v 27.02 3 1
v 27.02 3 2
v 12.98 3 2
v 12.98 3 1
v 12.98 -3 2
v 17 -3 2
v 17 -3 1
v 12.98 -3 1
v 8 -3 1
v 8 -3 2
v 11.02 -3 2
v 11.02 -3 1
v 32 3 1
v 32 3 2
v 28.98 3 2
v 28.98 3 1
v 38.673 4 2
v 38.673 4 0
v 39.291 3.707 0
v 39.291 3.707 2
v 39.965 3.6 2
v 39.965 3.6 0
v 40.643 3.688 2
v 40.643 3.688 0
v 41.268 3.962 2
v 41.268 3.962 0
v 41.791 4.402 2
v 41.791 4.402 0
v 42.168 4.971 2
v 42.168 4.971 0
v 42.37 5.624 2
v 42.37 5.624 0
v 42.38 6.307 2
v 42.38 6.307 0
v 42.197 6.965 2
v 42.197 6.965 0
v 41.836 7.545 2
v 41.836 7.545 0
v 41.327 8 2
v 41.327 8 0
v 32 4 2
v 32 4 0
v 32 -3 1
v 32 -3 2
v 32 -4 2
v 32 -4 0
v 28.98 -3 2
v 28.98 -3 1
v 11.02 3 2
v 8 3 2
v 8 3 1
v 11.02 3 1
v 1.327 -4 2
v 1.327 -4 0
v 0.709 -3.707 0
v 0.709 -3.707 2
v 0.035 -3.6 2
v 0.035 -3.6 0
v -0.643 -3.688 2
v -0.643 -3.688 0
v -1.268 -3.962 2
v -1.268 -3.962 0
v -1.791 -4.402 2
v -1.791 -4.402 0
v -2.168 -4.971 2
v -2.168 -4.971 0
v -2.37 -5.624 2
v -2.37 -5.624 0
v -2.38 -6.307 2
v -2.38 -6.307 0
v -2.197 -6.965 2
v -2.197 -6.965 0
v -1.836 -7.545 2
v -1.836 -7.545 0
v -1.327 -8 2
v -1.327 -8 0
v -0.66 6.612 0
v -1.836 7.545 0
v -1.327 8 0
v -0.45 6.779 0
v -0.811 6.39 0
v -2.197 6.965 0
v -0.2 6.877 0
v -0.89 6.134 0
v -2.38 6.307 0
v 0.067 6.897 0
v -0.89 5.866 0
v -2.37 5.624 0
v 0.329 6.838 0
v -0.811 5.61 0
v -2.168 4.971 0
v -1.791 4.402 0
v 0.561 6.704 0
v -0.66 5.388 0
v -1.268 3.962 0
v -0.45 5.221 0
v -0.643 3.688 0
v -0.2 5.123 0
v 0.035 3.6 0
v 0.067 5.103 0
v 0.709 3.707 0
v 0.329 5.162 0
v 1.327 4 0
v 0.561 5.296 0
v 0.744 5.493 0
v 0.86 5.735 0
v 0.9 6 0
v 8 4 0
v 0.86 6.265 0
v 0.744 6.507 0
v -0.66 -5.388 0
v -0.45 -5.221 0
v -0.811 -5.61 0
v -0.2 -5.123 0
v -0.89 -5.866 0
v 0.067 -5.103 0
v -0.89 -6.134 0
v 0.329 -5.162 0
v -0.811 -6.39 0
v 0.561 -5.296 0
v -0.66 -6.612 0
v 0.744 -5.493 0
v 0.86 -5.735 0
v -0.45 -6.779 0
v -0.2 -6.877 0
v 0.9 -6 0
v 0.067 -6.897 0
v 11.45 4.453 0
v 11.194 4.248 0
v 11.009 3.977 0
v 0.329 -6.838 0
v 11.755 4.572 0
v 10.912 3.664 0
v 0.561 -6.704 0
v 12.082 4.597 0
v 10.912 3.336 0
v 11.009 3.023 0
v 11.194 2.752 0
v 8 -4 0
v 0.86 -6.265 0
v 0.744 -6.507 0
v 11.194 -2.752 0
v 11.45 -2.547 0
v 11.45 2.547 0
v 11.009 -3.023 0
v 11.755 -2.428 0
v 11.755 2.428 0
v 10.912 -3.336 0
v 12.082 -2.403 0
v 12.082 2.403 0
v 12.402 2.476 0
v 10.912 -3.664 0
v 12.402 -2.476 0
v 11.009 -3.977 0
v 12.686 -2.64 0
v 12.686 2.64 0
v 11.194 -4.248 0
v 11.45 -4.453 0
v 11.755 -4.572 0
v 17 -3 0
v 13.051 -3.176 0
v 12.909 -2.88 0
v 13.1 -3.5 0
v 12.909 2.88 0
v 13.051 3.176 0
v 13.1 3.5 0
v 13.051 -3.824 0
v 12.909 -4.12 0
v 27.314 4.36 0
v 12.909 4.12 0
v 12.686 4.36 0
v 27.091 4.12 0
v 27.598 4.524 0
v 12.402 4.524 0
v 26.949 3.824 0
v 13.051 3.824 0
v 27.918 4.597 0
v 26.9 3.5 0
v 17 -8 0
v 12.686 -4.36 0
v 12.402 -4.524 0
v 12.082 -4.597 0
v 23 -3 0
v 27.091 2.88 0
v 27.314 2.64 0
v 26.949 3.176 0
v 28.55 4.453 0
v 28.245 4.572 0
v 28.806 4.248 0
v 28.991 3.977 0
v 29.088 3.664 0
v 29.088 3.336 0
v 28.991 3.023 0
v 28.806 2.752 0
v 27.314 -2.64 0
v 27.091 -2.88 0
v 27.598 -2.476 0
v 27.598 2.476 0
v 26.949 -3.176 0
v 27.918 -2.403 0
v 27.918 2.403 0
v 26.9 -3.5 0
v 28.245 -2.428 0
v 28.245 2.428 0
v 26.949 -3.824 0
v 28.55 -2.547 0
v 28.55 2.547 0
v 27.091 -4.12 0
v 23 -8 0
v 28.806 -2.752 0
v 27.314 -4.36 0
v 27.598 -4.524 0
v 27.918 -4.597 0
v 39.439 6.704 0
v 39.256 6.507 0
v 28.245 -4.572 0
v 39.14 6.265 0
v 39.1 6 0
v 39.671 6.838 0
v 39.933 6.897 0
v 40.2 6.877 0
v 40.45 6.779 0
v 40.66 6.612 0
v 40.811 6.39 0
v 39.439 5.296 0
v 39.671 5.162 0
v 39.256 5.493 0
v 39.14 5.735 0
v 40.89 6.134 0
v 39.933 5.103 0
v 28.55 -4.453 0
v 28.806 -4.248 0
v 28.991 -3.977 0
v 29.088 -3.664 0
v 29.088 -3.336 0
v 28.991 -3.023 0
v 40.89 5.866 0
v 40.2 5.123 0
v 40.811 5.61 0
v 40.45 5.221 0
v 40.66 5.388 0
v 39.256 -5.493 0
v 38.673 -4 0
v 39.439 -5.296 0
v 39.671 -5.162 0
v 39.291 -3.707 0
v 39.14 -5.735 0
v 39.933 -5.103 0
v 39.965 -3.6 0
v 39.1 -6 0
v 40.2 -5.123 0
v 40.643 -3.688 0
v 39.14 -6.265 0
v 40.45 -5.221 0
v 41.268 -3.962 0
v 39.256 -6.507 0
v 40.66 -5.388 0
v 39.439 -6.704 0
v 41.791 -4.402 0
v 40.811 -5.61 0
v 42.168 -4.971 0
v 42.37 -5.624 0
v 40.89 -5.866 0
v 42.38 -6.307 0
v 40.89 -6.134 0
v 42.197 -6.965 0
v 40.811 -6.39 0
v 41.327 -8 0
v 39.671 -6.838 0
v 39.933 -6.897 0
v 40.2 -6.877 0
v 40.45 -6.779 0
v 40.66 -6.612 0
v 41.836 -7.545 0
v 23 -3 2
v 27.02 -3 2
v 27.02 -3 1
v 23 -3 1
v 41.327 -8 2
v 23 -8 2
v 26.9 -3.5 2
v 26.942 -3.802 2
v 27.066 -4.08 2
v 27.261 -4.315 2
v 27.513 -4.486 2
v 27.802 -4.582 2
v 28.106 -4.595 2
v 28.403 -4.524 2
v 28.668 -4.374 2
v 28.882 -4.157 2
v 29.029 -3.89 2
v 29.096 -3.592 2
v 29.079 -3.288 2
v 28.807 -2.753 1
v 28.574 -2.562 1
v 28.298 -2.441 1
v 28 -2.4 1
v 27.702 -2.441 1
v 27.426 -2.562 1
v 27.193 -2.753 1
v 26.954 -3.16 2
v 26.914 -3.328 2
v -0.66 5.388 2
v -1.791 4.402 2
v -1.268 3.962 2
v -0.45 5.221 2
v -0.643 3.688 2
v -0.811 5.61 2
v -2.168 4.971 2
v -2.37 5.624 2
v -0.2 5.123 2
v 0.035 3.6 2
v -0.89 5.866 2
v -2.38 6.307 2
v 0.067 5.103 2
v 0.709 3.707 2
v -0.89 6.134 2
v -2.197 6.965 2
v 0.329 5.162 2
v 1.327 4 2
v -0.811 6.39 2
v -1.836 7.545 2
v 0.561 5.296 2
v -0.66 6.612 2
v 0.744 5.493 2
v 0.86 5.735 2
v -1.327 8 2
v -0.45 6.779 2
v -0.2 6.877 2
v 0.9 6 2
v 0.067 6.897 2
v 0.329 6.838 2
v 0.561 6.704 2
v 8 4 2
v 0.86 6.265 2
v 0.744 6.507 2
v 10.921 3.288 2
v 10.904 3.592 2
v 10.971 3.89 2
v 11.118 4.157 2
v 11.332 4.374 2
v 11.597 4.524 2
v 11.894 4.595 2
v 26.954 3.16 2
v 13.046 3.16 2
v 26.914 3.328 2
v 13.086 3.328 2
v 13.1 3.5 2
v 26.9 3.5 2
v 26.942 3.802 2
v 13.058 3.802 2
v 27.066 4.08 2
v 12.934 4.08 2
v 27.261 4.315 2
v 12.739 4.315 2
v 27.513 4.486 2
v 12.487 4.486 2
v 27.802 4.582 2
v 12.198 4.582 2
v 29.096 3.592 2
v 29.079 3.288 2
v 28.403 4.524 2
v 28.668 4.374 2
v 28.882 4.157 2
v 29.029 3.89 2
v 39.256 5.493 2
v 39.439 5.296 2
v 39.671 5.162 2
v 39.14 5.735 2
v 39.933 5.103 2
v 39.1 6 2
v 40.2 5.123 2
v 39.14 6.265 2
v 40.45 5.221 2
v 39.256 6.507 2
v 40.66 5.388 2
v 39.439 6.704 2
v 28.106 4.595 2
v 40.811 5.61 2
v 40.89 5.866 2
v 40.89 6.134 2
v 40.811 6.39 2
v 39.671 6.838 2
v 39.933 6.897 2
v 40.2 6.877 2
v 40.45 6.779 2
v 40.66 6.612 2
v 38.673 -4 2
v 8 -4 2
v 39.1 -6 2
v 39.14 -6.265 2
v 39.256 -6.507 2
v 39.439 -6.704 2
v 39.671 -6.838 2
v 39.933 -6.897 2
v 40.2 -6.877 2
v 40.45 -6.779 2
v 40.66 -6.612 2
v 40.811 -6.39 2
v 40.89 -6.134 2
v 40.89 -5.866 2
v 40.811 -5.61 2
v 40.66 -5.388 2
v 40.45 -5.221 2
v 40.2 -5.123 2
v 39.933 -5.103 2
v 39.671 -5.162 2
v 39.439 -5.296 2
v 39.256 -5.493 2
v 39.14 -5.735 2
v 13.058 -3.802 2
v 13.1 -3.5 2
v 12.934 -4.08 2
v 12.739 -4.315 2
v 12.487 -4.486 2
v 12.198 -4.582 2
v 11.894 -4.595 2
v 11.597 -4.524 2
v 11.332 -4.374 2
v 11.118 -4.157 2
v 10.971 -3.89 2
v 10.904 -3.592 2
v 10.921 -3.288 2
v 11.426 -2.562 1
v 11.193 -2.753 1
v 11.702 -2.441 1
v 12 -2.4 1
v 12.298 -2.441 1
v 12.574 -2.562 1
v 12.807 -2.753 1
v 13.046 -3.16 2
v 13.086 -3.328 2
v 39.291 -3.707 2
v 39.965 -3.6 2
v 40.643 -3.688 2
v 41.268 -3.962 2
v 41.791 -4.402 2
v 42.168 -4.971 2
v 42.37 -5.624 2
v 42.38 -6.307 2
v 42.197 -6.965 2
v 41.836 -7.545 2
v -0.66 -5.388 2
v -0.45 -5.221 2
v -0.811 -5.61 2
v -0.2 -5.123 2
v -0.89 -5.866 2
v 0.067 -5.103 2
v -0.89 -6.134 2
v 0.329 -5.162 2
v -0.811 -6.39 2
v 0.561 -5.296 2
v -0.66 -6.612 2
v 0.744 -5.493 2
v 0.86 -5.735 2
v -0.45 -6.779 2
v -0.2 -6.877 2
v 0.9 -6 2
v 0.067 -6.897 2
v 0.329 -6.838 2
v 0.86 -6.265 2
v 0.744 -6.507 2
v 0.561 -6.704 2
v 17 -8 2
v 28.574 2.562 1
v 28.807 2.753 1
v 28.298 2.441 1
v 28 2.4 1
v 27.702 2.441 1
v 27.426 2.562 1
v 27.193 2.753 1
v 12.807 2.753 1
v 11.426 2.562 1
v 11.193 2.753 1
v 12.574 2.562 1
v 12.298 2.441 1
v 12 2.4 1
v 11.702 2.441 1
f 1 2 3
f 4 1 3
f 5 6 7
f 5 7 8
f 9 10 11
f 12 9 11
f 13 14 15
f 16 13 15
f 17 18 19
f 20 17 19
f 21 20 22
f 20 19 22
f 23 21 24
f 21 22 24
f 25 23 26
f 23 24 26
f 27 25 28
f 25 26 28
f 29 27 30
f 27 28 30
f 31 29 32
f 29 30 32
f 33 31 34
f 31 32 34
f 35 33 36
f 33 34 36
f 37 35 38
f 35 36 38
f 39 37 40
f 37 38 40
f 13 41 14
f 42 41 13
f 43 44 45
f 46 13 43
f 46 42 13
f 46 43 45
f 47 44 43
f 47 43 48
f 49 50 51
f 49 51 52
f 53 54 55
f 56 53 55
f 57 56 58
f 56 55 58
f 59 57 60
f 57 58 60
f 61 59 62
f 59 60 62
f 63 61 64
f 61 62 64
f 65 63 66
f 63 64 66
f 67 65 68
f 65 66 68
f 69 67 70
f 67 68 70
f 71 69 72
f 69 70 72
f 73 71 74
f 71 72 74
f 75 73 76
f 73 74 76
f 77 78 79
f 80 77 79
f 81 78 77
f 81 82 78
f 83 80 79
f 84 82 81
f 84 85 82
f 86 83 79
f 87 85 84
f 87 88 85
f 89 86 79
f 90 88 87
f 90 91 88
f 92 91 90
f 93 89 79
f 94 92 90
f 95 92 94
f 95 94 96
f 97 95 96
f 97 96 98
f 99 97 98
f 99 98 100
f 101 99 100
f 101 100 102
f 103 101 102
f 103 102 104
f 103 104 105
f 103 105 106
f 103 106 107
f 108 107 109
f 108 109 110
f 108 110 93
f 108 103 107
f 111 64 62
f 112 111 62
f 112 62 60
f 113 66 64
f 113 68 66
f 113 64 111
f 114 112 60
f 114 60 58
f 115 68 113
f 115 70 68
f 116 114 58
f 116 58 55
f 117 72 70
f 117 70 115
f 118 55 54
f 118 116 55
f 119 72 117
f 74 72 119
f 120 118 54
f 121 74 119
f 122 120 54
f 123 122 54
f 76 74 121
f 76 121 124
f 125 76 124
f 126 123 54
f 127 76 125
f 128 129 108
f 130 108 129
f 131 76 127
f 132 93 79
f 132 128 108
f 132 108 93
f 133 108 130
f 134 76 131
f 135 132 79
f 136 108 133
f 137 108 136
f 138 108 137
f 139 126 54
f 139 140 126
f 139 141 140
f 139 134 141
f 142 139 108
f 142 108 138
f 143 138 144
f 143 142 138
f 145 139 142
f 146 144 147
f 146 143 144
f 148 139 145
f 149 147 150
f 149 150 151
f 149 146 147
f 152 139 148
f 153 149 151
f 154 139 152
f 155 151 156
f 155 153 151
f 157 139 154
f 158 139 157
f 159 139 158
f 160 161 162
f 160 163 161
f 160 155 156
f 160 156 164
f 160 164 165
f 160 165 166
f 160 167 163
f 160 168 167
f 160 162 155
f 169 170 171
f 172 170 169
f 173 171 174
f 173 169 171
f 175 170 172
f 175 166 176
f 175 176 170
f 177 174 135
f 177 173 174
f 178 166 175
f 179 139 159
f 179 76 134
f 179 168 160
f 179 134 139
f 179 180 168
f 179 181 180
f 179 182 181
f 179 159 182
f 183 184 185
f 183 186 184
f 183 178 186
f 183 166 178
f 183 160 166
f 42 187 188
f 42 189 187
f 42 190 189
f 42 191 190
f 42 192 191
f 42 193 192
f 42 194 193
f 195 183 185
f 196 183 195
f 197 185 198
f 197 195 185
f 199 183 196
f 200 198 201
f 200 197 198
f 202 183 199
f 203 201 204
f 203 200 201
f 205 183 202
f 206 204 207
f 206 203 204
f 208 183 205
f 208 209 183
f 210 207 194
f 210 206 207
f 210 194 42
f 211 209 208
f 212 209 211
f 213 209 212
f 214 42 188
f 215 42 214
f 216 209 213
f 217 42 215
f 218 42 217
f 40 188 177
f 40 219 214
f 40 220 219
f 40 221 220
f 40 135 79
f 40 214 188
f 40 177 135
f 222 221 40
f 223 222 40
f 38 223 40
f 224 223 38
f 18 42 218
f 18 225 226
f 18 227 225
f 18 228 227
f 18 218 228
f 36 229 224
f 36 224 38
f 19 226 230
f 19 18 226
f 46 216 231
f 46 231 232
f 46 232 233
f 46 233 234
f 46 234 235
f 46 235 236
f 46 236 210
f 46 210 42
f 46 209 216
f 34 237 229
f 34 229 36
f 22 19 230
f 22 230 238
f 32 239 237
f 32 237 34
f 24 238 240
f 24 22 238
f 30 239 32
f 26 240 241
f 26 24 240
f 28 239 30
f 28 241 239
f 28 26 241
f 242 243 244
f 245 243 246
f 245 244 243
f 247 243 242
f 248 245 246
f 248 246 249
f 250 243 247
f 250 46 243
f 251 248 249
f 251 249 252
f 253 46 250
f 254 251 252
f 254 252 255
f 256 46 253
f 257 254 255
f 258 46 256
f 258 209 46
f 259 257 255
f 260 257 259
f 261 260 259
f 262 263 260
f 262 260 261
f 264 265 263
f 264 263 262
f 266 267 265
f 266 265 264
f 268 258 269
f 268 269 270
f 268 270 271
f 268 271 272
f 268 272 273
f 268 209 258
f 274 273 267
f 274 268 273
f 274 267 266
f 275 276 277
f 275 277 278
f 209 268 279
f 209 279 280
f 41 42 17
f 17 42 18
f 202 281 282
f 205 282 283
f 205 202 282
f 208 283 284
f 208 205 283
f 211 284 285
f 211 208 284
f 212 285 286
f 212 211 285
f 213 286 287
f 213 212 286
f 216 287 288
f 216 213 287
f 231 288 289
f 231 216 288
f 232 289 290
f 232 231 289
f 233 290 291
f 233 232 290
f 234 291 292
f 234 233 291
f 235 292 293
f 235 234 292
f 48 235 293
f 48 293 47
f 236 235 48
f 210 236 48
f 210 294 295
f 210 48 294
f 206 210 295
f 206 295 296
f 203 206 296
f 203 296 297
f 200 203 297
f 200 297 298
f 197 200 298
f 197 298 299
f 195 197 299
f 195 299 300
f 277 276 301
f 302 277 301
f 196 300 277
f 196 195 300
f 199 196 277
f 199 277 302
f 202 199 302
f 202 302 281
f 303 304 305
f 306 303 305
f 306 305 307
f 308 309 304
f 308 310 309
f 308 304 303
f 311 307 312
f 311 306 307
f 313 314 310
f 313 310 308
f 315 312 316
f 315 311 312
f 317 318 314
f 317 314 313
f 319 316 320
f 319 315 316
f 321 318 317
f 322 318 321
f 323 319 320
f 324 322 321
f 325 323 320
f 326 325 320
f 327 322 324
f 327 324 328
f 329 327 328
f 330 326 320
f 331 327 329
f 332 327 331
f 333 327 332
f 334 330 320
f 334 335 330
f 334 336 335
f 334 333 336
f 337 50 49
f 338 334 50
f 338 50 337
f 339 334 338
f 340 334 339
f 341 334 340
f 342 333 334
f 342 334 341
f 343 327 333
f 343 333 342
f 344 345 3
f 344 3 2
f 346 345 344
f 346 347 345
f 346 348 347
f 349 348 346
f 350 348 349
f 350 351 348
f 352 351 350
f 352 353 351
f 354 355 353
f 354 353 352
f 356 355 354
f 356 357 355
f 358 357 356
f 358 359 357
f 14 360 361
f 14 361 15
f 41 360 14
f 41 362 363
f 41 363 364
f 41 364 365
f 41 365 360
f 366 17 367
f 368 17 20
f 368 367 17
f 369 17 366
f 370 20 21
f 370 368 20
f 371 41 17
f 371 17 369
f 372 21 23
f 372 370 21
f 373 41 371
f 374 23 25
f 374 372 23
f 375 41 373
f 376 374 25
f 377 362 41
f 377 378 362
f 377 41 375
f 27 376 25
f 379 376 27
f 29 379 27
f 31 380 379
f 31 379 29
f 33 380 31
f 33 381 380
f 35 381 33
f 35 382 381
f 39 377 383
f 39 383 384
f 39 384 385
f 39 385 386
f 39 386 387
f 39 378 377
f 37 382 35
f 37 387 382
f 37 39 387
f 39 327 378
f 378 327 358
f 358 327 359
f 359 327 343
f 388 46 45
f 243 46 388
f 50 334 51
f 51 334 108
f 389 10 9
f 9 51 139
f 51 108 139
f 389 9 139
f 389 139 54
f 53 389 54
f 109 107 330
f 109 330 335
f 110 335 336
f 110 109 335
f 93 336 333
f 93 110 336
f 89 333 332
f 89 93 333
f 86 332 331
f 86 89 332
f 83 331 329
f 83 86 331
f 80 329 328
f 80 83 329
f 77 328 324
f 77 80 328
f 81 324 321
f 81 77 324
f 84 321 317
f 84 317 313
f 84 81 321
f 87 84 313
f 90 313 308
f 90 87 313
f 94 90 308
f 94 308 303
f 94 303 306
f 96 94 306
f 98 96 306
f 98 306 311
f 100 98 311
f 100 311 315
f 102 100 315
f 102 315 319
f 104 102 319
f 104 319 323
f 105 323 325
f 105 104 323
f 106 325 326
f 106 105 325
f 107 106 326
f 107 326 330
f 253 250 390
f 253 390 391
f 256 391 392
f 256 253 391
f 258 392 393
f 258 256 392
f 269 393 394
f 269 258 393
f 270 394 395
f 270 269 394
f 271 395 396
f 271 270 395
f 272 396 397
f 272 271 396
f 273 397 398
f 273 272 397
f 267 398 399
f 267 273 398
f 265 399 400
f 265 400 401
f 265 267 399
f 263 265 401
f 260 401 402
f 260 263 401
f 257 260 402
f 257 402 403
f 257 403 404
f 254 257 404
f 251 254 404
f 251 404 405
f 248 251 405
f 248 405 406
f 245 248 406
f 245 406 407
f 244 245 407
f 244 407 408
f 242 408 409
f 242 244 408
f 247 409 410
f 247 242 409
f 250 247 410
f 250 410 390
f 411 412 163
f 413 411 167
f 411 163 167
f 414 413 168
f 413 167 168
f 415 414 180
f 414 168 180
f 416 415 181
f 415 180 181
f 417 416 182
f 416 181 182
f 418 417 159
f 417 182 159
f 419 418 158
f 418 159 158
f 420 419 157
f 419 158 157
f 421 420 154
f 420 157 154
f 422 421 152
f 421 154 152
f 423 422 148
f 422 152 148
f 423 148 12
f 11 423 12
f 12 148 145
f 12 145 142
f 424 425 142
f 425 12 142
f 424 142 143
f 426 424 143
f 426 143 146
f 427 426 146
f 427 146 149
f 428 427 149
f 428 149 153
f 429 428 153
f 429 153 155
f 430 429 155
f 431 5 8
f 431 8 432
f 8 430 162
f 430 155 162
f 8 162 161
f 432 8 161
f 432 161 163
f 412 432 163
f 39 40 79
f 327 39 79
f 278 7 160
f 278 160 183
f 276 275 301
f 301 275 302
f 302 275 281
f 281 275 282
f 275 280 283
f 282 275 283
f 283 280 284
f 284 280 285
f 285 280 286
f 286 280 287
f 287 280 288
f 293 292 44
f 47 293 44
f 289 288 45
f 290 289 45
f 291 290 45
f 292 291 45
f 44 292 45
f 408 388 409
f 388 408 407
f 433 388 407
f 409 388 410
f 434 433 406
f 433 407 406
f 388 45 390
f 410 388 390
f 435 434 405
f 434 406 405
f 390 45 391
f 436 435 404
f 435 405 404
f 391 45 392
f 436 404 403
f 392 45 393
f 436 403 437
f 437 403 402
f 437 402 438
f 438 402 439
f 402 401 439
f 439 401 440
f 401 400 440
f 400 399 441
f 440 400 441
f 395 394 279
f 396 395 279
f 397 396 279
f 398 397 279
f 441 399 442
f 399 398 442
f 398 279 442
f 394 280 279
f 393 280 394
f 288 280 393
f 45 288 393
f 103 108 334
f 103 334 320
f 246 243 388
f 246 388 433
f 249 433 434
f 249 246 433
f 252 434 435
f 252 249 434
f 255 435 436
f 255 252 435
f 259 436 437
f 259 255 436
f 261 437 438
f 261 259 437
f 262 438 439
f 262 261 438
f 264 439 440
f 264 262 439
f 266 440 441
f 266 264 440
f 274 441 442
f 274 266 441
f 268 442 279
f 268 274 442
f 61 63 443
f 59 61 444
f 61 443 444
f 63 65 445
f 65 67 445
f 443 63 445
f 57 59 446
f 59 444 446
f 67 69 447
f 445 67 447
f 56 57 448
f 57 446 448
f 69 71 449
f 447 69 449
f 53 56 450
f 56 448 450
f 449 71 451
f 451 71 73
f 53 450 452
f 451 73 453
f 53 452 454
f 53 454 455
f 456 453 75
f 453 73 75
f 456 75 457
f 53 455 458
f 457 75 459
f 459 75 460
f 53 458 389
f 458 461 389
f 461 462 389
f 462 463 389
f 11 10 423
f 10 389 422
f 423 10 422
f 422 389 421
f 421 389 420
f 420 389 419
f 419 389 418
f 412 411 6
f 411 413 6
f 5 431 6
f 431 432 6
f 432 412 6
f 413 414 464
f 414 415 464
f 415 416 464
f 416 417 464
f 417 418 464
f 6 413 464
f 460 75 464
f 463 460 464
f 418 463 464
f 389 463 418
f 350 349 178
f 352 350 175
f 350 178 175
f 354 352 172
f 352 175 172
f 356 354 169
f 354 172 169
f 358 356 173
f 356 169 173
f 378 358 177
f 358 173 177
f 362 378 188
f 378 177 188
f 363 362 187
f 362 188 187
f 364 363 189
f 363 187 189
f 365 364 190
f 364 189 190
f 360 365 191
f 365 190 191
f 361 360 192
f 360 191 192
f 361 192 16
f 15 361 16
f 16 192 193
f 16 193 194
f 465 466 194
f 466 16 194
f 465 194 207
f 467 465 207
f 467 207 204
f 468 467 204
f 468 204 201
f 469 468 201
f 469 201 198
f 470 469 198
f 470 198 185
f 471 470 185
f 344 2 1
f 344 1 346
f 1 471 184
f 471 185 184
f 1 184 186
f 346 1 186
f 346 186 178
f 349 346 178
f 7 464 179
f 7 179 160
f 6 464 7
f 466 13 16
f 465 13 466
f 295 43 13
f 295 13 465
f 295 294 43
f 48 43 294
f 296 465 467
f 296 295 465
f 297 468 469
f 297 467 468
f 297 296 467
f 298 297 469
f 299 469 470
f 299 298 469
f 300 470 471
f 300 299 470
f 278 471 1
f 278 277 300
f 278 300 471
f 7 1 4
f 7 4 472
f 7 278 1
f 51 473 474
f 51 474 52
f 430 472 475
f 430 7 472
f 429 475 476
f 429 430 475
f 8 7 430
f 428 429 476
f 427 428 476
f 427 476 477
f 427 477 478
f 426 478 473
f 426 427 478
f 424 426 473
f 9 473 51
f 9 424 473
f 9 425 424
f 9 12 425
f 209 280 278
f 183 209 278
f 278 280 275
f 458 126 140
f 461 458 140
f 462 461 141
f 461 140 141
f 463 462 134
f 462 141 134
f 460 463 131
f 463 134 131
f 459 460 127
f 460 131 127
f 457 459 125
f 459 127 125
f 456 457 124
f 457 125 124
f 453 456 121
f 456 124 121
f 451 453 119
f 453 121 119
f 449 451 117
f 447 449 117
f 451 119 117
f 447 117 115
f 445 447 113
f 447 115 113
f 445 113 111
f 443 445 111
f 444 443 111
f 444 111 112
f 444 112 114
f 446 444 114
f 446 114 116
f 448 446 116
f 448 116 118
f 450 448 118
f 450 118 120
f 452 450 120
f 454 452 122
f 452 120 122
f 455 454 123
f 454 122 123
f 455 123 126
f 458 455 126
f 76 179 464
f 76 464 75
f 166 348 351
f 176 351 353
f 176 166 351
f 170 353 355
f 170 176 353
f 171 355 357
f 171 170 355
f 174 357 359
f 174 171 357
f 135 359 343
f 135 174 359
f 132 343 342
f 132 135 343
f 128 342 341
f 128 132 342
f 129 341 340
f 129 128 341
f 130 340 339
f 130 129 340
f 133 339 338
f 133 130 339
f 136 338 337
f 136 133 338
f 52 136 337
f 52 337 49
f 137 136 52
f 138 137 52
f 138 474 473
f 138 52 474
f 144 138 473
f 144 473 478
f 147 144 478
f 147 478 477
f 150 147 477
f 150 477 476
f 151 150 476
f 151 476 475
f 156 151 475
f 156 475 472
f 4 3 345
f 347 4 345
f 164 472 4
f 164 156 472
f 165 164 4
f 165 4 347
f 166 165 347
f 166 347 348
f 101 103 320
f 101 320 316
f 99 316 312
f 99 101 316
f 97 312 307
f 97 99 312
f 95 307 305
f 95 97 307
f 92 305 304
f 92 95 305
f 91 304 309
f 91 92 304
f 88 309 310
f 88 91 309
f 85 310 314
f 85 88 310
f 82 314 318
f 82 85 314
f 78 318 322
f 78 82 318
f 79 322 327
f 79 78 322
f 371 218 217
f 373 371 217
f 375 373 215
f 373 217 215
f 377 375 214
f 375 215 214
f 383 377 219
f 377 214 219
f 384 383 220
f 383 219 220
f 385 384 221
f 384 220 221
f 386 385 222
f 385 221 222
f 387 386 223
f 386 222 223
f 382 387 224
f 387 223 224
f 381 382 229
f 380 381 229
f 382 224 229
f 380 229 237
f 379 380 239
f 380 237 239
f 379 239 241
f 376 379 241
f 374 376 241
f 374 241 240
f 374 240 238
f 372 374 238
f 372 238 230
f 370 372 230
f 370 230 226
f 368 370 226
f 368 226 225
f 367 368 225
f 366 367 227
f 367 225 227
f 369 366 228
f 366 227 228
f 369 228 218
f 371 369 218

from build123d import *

# Parameters (mm, degrees)
CROQUIS1_R              = 0.9
CROQUIS1_R_2            = 1.1
SALIENTE_EXTRUIR1_DEPTH = 2
CROQUIS2_W              = 12
CROQUIS2_H              = 3
CORTAR_EXTRUIR1_DEPTH   = 1
CROQUIS3_W              = 6
CROQUIS3_H              = 10
CORTAR_EXTRUIR2_DEPTH   = 44.194444087


with BuildPart() as part:
    # Croquis1 → Saliente-Extruir1 (new body)
    with BuildSketch(Plane.XY):
        with BuildLine():
            Line((-1.326649916, 8), (20, 8))
            Line((20, 8), (20, 0))
            Line((20, 0), (8, 0))
            Line((8, 0), (8, 4))
            Line((8, 4), (1.326649916, 4))
            ThreePointArc((1.326649916, 4), (-2, 4.673350084), (-1.326649916, 8))
        make_face()
        with Locations((0, 6)):
            Circle(CROQUIS1_R, mode=Mode.SUBTRACT)
        with Locations((12, 3.5)):
            Circle(CROQUIS1_R_2, mode=Mode.SUBTRACT)
    extrude(amount=SALIENTE_EXTRUIR1_DEPTH)

    # Croquis2 → Cortar-Extruir1 (cut)
    with BuildSketch(Plane.XY.offset(2)):
        with Locations((14, 1.5)):
            Rectangle(CROQUIS2_W, CROQUIS2_H)
    extrude(amount=-CORTAR_EXTRUIR1_DEPTH, mode=Mode.SUBTRACT)

    # Simetría1: part across plane


with BuildPart() as part_1:
    add(part.part)
    add(part.part.mirror(Plane(origin=(20, 0, 2), x_dir=(0, 0, 1), z_dir=(0, 1, 0))))

    # Simetría2: part across plane


with BuildPart() as part_2:
    add(part_1.part)
    add(part_1.part.mirror(Plane(origin=(20, 8, 2), x_dir=(0, 0, 1), z_dir=(-1, 0, 0))))

    # Croquis3 → Cortar-Extruir2 (cut, through all)
    with BuildSketch(Plane.XY.offset(2)):
        with Locations((20, -8)):
            Rectangle(CROQUIS3_W, CROQUIS3_H)
    extrude(amount=-CORTAR_EXTRUIR2_DEPTH, mode=Mode.SUBTRACT)


solid = part_2.part
